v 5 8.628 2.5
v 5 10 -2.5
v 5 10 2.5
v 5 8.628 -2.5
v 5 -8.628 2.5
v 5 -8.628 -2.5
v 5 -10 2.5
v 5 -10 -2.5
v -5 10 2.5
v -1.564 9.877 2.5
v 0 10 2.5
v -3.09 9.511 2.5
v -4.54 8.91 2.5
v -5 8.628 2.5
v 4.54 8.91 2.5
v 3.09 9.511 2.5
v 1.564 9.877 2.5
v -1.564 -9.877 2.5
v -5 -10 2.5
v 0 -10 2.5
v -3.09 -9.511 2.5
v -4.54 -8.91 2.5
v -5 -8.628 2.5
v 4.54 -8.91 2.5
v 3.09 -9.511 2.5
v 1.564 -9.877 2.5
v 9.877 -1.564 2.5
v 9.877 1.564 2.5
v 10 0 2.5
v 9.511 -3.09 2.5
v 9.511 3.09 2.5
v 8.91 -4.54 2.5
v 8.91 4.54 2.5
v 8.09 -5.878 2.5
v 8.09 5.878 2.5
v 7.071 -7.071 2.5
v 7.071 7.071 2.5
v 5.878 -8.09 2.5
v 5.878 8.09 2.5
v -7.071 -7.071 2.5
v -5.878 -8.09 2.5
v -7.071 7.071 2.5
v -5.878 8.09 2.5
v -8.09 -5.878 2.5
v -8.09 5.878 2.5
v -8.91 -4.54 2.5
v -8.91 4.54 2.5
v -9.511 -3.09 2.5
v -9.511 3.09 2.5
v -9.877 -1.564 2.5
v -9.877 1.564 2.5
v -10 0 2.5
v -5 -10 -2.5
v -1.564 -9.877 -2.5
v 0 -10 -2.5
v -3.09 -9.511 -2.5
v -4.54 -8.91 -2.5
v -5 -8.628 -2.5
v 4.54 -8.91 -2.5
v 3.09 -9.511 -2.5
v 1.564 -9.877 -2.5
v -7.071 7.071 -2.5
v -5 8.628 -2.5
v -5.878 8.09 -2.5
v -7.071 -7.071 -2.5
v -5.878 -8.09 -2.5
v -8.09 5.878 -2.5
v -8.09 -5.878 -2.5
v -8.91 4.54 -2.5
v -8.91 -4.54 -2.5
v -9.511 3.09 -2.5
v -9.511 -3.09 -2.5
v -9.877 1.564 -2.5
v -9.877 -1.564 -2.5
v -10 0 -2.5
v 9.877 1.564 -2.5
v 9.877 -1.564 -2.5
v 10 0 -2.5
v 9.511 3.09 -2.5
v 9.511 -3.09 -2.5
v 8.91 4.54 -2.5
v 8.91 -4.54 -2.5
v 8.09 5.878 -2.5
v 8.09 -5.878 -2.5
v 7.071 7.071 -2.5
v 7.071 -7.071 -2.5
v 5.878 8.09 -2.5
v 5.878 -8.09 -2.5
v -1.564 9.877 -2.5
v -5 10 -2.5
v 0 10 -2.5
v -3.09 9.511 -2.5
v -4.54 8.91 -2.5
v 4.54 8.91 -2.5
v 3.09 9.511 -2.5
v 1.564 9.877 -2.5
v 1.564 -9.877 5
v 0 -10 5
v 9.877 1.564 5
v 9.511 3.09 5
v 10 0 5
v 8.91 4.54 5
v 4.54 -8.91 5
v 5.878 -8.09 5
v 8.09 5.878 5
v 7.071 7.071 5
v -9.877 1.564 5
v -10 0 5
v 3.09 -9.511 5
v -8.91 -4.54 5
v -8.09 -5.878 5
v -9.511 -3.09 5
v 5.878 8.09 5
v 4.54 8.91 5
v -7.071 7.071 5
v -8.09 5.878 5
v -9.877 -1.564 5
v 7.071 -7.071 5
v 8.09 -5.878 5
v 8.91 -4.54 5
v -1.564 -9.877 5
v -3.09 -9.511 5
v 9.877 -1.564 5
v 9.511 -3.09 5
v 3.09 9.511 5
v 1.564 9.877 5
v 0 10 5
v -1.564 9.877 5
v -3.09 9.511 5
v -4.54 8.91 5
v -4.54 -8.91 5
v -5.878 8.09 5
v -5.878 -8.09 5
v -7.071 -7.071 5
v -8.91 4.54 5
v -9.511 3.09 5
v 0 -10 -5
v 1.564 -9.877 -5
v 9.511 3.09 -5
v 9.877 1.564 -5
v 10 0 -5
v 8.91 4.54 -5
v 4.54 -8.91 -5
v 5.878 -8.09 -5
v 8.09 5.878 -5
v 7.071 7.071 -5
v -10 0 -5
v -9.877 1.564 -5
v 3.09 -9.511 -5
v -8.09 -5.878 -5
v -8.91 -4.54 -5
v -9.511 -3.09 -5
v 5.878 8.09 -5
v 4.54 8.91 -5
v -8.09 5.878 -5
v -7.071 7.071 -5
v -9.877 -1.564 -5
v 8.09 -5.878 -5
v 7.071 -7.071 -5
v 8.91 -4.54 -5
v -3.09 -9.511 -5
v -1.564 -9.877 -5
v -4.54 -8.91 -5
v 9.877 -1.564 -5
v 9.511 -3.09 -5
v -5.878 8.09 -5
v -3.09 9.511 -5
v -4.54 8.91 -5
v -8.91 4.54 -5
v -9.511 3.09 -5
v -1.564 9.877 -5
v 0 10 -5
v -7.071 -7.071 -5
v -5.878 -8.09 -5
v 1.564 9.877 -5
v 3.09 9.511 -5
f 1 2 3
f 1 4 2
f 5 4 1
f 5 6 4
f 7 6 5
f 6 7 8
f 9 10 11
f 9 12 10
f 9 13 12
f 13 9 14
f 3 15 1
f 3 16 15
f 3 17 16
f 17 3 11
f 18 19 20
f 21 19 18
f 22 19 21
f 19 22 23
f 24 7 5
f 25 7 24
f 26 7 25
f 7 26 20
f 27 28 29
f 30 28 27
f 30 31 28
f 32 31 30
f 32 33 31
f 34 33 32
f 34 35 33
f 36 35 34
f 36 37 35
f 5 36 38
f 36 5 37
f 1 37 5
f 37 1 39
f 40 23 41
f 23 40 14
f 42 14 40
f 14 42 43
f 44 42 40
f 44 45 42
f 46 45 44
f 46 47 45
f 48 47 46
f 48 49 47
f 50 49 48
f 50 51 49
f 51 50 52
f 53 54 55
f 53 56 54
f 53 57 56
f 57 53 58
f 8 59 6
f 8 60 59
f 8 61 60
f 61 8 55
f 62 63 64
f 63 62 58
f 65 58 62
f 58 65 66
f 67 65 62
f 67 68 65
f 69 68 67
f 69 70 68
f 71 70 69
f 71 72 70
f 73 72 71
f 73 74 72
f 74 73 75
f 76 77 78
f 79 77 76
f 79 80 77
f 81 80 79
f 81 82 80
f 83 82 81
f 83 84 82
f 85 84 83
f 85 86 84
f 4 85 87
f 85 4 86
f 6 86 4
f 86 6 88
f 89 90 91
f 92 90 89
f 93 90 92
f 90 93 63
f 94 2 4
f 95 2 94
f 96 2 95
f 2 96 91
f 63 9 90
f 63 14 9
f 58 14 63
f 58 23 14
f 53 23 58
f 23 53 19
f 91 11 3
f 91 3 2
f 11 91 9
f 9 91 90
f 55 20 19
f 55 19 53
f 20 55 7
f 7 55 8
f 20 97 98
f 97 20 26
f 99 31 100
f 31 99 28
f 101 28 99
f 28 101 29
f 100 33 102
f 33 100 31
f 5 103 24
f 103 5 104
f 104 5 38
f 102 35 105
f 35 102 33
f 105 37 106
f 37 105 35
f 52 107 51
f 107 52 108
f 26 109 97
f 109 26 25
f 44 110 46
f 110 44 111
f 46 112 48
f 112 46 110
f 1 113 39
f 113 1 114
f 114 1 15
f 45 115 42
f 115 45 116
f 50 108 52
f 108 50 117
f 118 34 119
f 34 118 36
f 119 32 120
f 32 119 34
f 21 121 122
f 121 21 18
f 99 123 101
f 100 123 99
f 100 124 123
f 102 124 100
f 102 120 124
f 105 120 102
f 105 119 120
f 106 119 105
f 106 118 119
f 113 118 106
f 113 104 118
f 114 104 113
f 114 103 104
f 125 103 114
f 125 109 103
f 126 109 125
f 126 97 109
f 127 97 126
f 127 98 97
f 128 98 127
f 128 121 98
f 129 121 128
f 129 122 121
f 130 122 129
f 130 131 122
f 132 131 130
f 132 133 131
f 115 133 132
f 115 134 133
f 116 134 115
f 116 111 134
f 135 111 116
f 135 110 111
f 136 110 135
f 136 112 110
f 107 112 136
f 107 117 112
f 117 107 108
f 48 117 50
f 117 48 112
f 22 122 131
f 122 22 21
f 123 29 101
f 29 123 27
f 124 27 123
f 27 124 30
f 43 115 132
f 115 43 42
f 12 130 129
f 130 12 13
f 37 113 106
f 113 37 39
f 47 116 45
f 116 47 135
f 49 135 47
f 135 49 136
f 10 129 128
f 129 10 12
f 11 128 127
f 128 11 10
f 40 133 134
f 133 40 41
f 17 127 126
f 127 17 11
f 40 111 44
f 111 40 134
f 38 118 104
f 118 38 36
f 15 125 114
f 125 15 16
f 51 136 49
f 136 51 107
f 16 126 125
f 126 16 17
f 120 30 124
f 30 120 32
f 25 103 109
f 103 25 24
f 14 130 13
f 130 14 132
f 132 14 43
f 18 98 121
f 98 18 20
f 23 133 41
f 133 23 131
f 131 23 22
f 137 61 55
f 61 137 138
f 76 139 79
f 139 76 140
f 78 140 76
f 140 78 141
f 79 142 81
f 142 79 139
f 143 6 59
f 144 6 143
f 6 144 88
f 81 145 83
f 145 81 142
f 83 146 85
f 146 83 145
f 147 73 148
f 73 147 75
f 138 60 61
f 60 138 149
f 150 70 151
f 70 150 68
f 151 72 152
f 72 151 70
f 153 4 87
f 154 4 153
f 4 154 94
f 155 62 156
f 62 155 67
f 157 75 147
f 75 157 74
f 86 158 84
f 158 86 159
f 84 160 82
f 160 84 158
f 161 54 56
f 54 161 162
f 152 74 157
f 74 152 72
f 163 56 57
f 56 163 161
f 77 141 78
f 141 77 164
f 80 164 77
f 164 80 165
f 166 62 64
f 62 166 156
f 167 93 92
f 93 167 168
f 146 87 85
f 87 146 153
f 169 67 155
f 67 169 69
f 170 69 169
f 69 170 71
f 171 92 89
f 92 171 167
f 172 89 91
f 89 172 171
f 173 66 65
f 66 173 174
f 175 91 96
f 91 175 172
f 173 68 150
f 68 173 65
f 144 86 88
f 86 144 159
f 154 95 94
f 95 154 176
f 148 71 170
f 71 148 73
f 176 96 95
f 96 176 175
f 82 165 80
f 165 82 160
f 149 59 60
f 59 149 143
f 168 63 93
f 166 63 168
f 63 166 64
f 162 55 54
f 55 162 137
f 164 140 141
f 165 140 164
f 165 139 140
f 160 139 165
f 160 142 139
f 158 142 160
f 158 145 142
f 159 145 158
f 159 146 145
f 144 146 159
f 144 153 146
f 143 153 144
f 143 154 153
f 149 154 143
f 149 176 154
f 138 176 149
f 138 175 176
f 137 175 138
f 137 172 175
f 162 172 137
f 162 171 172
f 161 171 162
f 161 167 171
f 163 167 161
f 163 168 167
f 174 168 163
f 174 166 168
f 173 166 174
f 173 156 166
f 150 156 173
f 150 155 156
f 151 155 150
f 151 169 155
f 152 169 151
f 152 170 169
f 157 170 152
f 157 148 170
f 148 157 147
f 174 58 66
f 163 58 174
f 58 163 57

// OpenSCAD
//Author: Chris Correll
//Date: 9/13/2022
//Description: Lesson 2.0 Variables and Parametric Programming Teacher 

//This is a variable it has two components, a name, var, and an assignment of value, 10, variables can not have spaces and must start with letters
var = 10;

//We want variable names to be descriptive var is a bad name, lets make our first variable

//In openSCAD you have to both declare (name) and intialize (assign a value) to variables from now on when I say declare I mean name and assign a value to

//When we use variables in our model we are "parameterizing" our model. When we define the shapes in our model in relation to the same variables we can easily change our model without having to rewrite a whole bunch of code

//Declare a variable "res" and make the global resolution equal to it
res = 40;
$fn = res;

//this is a pretty useless variable bc we probably wont use the resolution any where except here... go on to see why variables are useful
// you can shorten variables names to make it less work for you but make sure they are common shortenting and make sense within the context of your program ie w for width would make since but he for height would probably not


//Declare three variables w_cube, l_cube, h_cube
w_cube = 10;
l_cube = 20;
h_cube = 5;

//Make a centered cube with the variables
cube([w_cube,l_cube,h_cube], center=true);

// We can do math operations on variables like multiply * and divide / and addition + and subtraction - . These are known as special characters they can not be included in variable names. The only special character you should use in a variable name is _ 

//Make a centered cylinder that is half the height and twice the width of the cube by declaring a variable h_cyl and setting it equal to h/2 matybe change variable so its name is cube h and h_cylinder
h_cyl = h_cube/2;
w_cyl = 2*w_cube;

translate([0,0,h_cyl/2+h_cube/2]) //half the height of the cylinder moves it to touching the xy plane, half the height of the cuve
cylinder(d= w_cyl, h=h_cyl, center=true);

//move so we have a cylinder at the bottom too
translate([0,0,-h_cyl/2-h_cube/2]) //half the height of the cylinder moves it to touching the xy plane, half the height of the cuve
cylinder(d= 2*w_cube, h=h_cyl, center=true);

//Place the cylinder so that it is on top of the cube (hint remember where translation commands go)

//Change your variables and see how the shapes respond!
